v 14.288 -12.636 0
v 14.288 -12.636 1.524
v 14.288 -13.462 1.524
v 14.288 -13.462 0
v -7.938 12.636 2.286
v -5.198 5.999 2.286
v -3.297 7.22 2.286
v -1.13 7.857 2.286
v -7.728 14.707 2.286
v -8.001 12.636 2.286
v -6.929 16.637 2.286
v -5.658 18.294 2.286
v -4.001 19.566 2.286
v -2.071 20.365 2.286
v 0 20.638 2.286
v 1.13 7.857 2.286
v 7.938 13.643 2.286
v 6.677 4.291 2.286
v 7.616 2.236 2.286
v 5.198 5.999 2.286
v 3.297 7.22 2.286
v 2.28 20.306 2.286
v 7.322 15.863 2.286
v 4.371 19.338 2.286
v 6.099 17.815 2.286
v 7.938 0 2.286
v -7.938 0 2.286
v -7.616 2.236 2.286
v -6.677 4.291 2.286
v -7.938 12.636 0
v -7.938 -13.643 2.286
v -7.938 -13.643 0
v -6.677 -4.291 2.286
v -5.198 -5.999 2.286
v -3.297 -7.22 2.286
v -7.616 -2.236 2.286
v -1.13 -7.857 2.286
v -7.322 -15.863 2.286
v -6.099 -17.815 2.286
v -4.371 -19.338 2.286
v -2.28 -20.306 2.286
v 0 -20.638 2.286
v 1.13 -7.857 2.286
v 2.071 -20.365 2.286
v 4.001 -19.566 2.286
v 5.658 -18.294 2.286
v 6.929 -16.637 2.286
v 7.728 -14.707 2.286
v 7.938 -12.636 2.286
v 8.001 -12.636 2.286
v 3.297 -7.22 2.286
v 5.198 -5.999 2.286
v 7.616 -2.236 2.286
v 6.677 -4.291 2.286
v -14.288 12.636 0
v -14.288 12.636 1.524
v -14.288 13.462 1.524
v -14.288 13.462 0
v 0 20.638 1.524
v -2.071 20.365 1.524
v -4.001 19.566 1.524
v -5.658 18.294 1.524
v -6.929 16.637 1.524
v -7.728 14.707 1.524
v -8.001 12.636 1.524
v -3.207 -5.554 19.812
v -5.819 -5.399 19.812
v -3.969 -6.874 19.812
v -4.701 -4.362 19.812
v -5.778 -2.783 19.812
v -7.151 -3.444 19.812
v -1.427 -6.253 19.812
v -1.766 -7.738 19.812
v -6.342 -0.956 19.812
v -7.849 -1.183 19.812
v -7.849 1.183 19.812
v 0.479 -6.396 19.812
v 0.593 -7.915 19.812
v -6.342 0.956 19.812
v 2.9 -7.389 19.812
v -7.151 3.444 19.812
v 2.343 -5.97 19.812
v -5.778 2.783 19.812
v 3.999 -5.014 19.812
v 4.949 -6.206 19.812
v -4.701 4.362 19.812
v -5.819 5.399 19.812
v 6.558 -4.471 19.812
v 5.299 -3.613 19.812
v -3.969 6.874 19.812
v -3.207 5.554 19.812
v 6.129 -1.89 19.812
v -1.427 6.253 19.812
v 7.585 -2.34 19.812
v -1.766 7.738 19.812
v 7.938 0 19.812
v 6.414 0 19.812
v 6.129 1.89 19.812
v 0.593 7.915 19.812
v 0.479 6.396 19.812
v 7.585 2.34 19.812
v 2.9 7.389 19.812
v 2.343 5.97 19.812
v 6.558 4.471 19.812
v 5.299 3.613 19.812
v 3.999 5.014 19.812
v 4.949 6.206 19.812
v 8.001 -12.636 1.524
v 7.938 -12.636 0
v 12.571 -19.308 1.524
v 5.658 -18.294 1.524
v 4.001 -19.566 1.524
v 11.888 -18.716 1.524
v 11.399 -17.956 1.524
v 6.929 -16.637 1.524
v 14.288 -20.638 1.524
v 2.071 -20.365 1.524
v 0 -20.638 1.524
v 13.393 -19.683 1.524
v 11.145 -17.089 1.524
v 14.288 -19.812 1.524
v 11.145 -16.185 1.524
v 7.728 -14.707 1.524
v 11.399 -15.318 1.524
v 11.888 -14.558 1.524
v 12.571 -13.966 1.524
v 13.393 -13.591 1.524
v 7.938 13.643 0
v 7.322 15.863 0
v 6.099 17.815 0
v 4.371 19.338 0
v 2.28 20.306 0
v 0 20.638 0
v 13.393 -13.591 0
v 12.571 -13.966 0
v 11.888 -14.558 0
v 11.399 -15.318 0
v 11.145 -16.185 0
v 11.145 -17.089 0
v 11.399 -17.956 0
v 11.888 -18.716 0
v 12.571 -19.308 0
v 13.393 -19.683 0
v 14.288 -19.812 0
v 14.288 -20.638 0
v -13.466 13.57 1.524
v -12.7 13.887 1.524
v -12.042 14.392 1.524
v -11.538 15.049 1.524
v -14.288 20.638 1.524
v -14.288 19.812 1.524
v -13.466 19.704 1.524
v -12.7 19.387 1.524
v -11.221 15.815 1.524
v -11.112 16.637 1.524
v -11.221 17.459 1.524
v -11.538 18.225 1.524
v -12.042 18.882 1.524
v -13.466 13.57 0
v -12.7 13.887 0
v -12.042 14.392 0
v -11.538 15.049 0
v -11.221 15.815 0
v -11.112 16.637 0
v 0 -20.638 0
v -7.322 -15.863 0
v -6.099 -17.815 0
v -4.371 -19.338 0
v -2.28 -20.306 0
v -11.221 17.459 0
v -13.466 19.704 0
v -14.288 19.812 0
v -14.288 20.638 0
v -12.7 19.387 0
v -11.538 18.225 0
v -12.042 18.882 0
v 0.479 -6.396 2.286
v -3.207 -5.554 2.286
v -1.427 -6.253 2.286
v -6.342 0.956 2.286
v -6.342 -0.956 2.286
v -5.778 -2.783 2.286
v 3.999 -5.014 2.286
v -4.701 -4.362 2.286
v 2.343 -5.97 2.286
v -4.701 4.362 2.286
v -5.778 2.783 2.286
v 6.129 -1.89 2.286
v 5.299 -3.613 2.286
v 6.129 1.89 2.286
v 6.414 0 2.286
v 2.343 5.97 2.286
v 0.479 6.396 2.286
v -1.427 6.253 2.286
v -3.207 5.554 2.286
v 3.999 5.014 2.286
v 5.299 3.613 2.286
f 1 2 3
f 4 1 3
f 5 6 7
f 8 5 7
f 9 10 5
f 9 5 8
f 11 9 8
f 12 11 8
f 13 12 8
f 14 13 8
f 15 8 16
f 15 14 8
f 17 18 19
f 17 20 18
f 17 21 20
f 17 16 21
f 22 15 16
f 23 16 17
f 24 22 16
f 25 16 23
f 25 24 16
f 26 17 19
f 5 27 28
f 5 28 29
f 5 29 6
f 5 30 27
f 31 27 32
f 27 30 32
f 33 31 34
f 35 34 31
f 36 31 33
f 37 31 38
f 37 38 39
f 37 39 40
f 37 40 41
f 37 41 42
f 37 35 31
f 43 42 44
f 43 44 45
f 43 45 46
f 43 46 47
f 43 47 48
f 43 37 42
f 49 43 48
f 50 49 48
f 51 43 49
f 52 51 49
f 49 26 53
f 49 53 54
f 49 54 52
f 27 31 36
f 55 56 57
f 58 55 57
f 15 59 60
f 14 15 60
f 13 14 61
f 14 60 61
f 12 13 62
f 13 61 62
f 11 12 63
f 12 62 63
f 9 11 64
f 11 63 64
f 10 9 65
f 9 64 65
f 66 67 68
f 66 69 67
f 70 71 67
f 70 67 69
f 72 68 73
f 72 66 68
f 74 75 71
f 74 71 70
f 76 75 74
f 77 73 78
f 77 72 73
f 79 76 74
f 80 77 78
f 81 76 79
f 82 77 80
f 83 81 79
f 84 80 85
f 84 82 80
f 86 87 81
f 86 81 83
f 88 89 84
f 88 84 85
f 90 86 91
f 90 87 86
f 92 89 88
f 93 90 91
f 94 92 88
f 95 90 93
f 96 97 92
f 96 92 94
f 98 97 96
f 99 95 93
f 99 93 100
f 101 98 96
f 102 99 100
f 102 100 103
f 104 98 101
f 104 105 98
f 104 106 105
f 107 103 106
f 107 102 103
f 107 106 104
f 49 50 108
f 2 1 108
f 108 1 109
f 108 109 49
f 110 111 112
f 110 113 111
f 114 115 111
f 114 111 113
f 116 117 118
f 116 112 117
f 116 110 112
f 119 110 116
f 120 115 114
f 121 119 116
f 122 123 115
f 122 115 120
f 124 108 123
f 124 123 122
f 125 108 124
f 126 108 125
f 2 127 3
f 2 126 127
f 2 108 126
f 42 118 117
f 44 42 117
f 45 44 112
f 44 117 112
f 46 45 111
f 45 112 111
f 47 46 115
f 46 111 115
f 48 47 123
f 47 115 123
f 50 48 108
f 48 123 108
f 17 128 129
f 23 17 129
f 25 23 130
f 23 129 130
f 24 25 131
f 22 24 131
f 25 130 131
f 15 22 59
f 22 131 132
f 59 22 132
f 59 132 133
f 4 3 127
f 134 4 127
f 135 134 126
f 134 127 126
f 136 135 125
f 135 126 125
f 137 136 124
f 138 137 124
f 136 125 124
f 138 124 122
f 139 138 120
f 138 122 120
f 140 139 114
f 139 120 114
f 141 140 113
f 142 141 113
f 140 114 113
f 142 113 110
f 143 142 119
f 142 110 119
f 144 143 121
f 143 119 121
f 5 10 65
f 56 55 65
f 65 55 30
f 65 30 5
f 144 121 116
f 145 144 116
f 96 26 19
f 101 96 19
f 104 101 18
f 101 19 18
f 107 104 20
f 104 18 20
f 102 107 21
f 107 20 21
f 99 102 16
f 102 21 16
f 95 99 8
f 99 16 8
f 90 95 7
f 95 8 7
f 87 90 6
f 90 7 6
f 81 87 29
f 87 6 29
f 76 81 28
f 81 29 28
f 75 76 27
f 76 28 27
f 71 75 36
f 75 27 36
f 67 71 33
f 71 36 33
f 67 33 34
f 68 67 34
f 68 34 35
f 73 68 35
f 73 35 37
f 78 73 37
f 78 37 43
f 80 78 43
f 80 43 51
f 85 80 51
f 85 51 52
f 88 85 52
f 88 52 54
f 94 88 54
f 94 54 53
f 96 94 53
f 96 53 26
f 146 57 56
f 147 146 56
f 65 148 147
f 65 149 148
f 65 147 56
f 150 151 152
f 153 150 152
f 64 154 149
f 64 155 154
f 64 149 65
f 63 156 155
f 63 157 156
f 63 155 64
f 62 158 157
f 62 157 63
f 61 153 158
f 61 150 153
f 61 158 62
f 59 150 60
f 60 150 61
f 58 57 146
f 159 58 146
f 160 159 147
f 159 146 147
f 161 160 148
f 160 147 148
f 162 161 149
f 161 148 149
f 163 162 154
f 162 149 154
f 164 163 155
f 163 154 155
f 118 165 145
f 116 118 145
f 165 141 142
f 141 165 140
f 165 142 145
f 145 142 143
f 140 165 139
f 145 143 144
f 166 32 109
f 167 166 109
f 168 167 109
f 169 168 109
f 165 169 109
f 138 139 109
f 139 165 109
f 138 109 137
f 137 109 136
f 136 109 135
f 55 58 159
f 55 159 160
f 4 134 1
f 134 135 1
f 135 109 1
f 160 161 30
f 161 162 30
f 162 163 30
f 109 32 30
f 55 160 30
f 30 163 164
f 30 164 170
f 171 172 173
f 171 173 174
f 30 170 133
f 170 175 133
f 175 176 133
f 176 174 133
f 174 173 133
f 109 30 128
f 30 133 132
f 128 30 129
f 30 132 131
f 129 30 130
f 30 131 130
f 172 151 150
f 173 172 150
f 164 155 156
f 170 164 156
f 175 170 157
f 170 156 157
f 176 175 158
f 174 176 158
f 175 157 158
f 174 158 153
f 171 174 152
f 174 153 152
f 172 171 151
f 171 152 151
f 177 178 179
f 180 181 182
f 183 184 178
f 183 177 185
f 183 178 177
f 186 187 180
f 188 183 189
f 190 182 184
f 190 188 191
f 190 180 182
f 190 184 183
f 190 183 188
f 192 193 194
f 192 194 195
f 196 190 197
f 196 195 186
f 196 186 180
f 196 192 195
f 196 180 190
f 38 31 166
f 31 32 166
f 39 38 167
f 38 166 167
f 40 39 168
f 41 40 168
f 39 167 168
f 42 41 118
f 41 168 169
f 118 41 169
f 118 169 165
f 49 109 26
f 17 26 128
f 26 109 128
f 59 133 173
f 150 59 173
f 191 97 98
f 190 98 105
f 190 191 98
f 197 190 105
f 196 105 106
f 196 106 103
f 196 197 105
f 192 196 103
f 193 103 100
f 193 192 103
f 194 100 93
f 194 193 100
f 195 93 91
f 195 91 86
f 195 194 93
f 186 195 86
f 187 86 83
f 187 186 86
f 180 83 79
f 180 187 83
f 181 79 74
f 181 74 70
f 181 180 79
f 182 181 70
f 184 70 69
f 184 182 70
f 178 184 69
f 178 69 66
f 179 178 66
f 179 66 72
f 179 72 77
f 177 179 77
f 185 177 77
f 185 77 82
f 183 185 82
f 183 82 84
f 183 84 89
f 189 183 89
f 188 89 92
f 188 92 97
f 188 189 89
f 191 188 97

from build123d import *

# Parameters (mm, degrees)
F0_W     = 15.875
F0_H     = 25.273
F1_DEPTH = 1.524
F3_DEPTH = 0.762
F4_R     = 6.4135
F5_DEPTH = 17.526
F7_DEPTH = 25.4
F9_DEPTH = 25.4


with BuildPart() as f1:
    # F0 (on Top) → F1 (new body)
    with BuildSketch(Plane.XY):
        with BuildLine():
            Line((-7.9375, 13.6425291994), (-7.9375, 20.6375))
            Line((-7.9375, 20.6375), (-20.6375, 20.6375))
            Line((-20.6375, 20.6375), (-20.6375, 19.05))
            ThreePointArc((-20.6375, 19.05), (-18.931251337, 18.343248663), (-18.2245, 16.637))
            ThreePointArc((-18.2245, 16.637), (-18.931251337, 14.930751337), (-20.6375, 14.224))
            Line((-20.6375, 14.224), (-20.6375, 12.6365))
            Line((-20.6375, 12.6365), (-7.9375, 12.6365))
            Line((-7.9375, 12.6365), (-7.9375, 13.6425291994))
        make_face()
        with BuildLine():
            ThreePointArc((-7.9375, 13.6425291994), (-5.2899320117, 18.6392177438), (0, 20.6375))
            Line((0, 20.6375), (-7.9375, 20.6375))
            Line((-7.9375, 20.6375), (-7.9375, 13.6425291994))
        make_face()
        with BuildLine():
            ThreePointArc((7.9375, 13.6425291994), (5.2899320117, 18.6392177438), (0, 20.6375))
            ThreePointArc((0, 20.6375), (-5.2899320117, 18.6392177438), (-7.9375, 13.6425291994))
            Line((-7.9375, 13.6425291994), (-7.9375, 12.6365))
            Line((-7.9375, 12.6365), (7.9375, 12.6365))
            Line((7.9375, 12.6365), (7.9375, 13.6425291994))
        make_face()
        Rectangle(F0_W, F0_H)
        with BuildLine():
            Line((7.9375, -13.6425291994), (7.9375, -12.6365))
            Line((7.9375, -12.6365), (-7.9375, -12.6365))
            Line((-7.9375, -12.6365), (-7.9375, -13.6425291994))
            ThreePointArc((-7.9375, -13.6425291994), (-5.2899320117, -18.6392177438), (0, -20.6375))
            ThreePointArc((0, -20.6375), (5.2899320117, -18.6392177438), (7.9375, -13.6425291994))
        make_face()
        with BuildLine():
            Line((7.9375, -20.6375), (7.9375, -13.6425291994))
            ThreePointArc((7.9375, -13.6425291994), (5.2899320117, -18.6392177438), (0, -20.6375))
            Line((0, -20.6375), (7.9375, -20.6375))
        make_face()
        with BuildLine():
            Line((20.6375, -14.224), (20.6375, -12.6365))
            Line((20.6375, -12.6365), (7.9375, -12.6365))
            Line((7.9375, -12.6365), (7.9375, -13.6425291994))
            Line((7.9375, -13.6425291994), (7.9375, -20.6375))
            Line((7.9375, -20.6375), (20.6375, -20.6375))
            Line((20.6375, -20.6375), (20.6375, -19.05))
            ThreePointArc((20.6375, -19.05), (18.2245, -16.637), (20.6375, -14.224))
        make_face()
    extrude(amount=F1_DEPTH)

    # F2 (on face) → F3 (join)
    with BuildSketch(Plane.XY.offset(1.524)):
        with BuildLine():
            ThreePointArc((7.9375, 13.6425291994), (5.2899320117, 18.6392177438), (0, 20.6375))
            ThreePointArc((0, 20.6375), (-5.6575613563, 18.2940613563), (-8.001, 12.6365))
            Line((-8.001, 12.6365), (-7.9375, 12.6365))
            Line((-7.9375, 12.6365), (-7.9375, -13.6425291994))
            ThreePointArc((-7.9375, -13.6425291994), (-5.2899320117, -18.6392177438), (0, -20.6375))
            ThreePointArc((0, -20.6375), (5.6575613563, -18.2940613563), (8.001, -12.6365))
            Line((8.001, -12.6365), (7.9375, -12.6365))
            Line((7.9375, -12.6365), (7.9375, 13.6425291994))
        make_face()
    extrude(amount=F3_DEPTH)

    # F4 (on face) → F5 (join)
    with BuildSketch(Plane.XY.offset(2.286)):
        with BuildLine():
            ThreePointArc((-7.9375, -2.94e-08), (1.47e-08, -7.9375), (7.9375, 0))
            ThreePointArc((7.9375, 0), (-1.47e-08, 7.9375), (-7.9375, -2.94e-08))
        make_face()
        Circle(F4_R, mode=Mode.SUBTRACT)
    extrude(amount=F5_DEPTH)

    # F6 (on face) → F7 (cut)
    with BuildSketch(Plane.XY.offset(1.524)):
        with BuildLine():
            Line((-14.2875, 20.6375), (-20.6375, 20.6375))
            Line((-20.6375, 20.6375), (-20.6375, 19.05))
            ThreePointArc((-20.6375, 19.05), (-18.2245, 16.637), (-20.6375, 14.224))
            Line((-20.6375, 14.224), (-20.6375, 12.6365))
            Line((-20.6375, 12.6365), (-14.2875, 12.6365))
            Line((-14.2875, 12.6365), (-14.2875, 13.462))
            ThreePointArc((-14.2875, 13.462), (-17.4625, 16.637), (-14.2875, 19.812))
            Line((-14.2875, 19.812), (-14.2875, 20.6375))
        make_face()
        with BuildLine():
            Line((-14.2875, 13.462), (-14.2875, 19.812))
            ThreePointArc((-14.2875, 19.812), (-17.4625, 16.637), (-14.2875, 13.462))
        make_face()
        with BuildLine():
            ThreePointArc((-11.1125, 16.637), (-12.0424359697, 18.8820640303), (-14.2875, 19.812))
            Line((-14.2875, 19.812), (-14.2875, 13.462))
            ThreePointArc((-14.2875, 13.462), (-12.0424359697, 14.3919359697), (-11.1125, 16.637))
        make_face()
    extrude(amount=-F7_DEPTH, mode=Mode.SUBTRACT)

    # F8 (on face) → F9 (cut)
    with BuildSketch(Plane.XY.offset(1.524)):
        with BuildLine():
            ThreePointArc((14.2875, -13.462), (11.1125, -16.637), (14.2875, -19.812))
            Line((14.2875, -19.812), (14.2875, -13.462))
        make_face()
        with BuildLine():
            Line((14.2875, -13.462), (14.2875, -19.812))
            ThreePointArc((14.2875, -19.812), (16.5325640303, -18.8820640303), (17.4625, -16.637))
            ThreePointArc((17.4625, -16.637), (16.5325640303, -14.3919359697), (14.2875, -13.462))
        make_face()
        with BuildLine():
            Line((14.2875, -20.6375), (20.6375, -20.6375))
            Line((20.6375, -20.6375), (20.6375, -19.05))
            ThreePointArc((20.6375, -19.05), (18.2245, -16.637), (20.6375, -14.224))
            Line((20.6375, -14.224), (20.6375, -12.6365))
            Line((20.6375, -12.6365), (14.2875, -12.6365))
            Line((14.2875, -12.6365), (14.2875, -13.462))
            ThreePointArc((14.2875, -13.462), (16.5325640303, -14.3919359697), (17.4625, -16.637))
            ThreePointArc((17.4625, -16.637), (16.5325640303, -18.8820640303), (14.2875, -19.812))
            Line((14.2875, -19.812), (14.2875, -20.6375))
        make_face()
    extrude(amount=-F9_DEPTH, mode=Mode.SUBTRACT)


solid = f1.part
